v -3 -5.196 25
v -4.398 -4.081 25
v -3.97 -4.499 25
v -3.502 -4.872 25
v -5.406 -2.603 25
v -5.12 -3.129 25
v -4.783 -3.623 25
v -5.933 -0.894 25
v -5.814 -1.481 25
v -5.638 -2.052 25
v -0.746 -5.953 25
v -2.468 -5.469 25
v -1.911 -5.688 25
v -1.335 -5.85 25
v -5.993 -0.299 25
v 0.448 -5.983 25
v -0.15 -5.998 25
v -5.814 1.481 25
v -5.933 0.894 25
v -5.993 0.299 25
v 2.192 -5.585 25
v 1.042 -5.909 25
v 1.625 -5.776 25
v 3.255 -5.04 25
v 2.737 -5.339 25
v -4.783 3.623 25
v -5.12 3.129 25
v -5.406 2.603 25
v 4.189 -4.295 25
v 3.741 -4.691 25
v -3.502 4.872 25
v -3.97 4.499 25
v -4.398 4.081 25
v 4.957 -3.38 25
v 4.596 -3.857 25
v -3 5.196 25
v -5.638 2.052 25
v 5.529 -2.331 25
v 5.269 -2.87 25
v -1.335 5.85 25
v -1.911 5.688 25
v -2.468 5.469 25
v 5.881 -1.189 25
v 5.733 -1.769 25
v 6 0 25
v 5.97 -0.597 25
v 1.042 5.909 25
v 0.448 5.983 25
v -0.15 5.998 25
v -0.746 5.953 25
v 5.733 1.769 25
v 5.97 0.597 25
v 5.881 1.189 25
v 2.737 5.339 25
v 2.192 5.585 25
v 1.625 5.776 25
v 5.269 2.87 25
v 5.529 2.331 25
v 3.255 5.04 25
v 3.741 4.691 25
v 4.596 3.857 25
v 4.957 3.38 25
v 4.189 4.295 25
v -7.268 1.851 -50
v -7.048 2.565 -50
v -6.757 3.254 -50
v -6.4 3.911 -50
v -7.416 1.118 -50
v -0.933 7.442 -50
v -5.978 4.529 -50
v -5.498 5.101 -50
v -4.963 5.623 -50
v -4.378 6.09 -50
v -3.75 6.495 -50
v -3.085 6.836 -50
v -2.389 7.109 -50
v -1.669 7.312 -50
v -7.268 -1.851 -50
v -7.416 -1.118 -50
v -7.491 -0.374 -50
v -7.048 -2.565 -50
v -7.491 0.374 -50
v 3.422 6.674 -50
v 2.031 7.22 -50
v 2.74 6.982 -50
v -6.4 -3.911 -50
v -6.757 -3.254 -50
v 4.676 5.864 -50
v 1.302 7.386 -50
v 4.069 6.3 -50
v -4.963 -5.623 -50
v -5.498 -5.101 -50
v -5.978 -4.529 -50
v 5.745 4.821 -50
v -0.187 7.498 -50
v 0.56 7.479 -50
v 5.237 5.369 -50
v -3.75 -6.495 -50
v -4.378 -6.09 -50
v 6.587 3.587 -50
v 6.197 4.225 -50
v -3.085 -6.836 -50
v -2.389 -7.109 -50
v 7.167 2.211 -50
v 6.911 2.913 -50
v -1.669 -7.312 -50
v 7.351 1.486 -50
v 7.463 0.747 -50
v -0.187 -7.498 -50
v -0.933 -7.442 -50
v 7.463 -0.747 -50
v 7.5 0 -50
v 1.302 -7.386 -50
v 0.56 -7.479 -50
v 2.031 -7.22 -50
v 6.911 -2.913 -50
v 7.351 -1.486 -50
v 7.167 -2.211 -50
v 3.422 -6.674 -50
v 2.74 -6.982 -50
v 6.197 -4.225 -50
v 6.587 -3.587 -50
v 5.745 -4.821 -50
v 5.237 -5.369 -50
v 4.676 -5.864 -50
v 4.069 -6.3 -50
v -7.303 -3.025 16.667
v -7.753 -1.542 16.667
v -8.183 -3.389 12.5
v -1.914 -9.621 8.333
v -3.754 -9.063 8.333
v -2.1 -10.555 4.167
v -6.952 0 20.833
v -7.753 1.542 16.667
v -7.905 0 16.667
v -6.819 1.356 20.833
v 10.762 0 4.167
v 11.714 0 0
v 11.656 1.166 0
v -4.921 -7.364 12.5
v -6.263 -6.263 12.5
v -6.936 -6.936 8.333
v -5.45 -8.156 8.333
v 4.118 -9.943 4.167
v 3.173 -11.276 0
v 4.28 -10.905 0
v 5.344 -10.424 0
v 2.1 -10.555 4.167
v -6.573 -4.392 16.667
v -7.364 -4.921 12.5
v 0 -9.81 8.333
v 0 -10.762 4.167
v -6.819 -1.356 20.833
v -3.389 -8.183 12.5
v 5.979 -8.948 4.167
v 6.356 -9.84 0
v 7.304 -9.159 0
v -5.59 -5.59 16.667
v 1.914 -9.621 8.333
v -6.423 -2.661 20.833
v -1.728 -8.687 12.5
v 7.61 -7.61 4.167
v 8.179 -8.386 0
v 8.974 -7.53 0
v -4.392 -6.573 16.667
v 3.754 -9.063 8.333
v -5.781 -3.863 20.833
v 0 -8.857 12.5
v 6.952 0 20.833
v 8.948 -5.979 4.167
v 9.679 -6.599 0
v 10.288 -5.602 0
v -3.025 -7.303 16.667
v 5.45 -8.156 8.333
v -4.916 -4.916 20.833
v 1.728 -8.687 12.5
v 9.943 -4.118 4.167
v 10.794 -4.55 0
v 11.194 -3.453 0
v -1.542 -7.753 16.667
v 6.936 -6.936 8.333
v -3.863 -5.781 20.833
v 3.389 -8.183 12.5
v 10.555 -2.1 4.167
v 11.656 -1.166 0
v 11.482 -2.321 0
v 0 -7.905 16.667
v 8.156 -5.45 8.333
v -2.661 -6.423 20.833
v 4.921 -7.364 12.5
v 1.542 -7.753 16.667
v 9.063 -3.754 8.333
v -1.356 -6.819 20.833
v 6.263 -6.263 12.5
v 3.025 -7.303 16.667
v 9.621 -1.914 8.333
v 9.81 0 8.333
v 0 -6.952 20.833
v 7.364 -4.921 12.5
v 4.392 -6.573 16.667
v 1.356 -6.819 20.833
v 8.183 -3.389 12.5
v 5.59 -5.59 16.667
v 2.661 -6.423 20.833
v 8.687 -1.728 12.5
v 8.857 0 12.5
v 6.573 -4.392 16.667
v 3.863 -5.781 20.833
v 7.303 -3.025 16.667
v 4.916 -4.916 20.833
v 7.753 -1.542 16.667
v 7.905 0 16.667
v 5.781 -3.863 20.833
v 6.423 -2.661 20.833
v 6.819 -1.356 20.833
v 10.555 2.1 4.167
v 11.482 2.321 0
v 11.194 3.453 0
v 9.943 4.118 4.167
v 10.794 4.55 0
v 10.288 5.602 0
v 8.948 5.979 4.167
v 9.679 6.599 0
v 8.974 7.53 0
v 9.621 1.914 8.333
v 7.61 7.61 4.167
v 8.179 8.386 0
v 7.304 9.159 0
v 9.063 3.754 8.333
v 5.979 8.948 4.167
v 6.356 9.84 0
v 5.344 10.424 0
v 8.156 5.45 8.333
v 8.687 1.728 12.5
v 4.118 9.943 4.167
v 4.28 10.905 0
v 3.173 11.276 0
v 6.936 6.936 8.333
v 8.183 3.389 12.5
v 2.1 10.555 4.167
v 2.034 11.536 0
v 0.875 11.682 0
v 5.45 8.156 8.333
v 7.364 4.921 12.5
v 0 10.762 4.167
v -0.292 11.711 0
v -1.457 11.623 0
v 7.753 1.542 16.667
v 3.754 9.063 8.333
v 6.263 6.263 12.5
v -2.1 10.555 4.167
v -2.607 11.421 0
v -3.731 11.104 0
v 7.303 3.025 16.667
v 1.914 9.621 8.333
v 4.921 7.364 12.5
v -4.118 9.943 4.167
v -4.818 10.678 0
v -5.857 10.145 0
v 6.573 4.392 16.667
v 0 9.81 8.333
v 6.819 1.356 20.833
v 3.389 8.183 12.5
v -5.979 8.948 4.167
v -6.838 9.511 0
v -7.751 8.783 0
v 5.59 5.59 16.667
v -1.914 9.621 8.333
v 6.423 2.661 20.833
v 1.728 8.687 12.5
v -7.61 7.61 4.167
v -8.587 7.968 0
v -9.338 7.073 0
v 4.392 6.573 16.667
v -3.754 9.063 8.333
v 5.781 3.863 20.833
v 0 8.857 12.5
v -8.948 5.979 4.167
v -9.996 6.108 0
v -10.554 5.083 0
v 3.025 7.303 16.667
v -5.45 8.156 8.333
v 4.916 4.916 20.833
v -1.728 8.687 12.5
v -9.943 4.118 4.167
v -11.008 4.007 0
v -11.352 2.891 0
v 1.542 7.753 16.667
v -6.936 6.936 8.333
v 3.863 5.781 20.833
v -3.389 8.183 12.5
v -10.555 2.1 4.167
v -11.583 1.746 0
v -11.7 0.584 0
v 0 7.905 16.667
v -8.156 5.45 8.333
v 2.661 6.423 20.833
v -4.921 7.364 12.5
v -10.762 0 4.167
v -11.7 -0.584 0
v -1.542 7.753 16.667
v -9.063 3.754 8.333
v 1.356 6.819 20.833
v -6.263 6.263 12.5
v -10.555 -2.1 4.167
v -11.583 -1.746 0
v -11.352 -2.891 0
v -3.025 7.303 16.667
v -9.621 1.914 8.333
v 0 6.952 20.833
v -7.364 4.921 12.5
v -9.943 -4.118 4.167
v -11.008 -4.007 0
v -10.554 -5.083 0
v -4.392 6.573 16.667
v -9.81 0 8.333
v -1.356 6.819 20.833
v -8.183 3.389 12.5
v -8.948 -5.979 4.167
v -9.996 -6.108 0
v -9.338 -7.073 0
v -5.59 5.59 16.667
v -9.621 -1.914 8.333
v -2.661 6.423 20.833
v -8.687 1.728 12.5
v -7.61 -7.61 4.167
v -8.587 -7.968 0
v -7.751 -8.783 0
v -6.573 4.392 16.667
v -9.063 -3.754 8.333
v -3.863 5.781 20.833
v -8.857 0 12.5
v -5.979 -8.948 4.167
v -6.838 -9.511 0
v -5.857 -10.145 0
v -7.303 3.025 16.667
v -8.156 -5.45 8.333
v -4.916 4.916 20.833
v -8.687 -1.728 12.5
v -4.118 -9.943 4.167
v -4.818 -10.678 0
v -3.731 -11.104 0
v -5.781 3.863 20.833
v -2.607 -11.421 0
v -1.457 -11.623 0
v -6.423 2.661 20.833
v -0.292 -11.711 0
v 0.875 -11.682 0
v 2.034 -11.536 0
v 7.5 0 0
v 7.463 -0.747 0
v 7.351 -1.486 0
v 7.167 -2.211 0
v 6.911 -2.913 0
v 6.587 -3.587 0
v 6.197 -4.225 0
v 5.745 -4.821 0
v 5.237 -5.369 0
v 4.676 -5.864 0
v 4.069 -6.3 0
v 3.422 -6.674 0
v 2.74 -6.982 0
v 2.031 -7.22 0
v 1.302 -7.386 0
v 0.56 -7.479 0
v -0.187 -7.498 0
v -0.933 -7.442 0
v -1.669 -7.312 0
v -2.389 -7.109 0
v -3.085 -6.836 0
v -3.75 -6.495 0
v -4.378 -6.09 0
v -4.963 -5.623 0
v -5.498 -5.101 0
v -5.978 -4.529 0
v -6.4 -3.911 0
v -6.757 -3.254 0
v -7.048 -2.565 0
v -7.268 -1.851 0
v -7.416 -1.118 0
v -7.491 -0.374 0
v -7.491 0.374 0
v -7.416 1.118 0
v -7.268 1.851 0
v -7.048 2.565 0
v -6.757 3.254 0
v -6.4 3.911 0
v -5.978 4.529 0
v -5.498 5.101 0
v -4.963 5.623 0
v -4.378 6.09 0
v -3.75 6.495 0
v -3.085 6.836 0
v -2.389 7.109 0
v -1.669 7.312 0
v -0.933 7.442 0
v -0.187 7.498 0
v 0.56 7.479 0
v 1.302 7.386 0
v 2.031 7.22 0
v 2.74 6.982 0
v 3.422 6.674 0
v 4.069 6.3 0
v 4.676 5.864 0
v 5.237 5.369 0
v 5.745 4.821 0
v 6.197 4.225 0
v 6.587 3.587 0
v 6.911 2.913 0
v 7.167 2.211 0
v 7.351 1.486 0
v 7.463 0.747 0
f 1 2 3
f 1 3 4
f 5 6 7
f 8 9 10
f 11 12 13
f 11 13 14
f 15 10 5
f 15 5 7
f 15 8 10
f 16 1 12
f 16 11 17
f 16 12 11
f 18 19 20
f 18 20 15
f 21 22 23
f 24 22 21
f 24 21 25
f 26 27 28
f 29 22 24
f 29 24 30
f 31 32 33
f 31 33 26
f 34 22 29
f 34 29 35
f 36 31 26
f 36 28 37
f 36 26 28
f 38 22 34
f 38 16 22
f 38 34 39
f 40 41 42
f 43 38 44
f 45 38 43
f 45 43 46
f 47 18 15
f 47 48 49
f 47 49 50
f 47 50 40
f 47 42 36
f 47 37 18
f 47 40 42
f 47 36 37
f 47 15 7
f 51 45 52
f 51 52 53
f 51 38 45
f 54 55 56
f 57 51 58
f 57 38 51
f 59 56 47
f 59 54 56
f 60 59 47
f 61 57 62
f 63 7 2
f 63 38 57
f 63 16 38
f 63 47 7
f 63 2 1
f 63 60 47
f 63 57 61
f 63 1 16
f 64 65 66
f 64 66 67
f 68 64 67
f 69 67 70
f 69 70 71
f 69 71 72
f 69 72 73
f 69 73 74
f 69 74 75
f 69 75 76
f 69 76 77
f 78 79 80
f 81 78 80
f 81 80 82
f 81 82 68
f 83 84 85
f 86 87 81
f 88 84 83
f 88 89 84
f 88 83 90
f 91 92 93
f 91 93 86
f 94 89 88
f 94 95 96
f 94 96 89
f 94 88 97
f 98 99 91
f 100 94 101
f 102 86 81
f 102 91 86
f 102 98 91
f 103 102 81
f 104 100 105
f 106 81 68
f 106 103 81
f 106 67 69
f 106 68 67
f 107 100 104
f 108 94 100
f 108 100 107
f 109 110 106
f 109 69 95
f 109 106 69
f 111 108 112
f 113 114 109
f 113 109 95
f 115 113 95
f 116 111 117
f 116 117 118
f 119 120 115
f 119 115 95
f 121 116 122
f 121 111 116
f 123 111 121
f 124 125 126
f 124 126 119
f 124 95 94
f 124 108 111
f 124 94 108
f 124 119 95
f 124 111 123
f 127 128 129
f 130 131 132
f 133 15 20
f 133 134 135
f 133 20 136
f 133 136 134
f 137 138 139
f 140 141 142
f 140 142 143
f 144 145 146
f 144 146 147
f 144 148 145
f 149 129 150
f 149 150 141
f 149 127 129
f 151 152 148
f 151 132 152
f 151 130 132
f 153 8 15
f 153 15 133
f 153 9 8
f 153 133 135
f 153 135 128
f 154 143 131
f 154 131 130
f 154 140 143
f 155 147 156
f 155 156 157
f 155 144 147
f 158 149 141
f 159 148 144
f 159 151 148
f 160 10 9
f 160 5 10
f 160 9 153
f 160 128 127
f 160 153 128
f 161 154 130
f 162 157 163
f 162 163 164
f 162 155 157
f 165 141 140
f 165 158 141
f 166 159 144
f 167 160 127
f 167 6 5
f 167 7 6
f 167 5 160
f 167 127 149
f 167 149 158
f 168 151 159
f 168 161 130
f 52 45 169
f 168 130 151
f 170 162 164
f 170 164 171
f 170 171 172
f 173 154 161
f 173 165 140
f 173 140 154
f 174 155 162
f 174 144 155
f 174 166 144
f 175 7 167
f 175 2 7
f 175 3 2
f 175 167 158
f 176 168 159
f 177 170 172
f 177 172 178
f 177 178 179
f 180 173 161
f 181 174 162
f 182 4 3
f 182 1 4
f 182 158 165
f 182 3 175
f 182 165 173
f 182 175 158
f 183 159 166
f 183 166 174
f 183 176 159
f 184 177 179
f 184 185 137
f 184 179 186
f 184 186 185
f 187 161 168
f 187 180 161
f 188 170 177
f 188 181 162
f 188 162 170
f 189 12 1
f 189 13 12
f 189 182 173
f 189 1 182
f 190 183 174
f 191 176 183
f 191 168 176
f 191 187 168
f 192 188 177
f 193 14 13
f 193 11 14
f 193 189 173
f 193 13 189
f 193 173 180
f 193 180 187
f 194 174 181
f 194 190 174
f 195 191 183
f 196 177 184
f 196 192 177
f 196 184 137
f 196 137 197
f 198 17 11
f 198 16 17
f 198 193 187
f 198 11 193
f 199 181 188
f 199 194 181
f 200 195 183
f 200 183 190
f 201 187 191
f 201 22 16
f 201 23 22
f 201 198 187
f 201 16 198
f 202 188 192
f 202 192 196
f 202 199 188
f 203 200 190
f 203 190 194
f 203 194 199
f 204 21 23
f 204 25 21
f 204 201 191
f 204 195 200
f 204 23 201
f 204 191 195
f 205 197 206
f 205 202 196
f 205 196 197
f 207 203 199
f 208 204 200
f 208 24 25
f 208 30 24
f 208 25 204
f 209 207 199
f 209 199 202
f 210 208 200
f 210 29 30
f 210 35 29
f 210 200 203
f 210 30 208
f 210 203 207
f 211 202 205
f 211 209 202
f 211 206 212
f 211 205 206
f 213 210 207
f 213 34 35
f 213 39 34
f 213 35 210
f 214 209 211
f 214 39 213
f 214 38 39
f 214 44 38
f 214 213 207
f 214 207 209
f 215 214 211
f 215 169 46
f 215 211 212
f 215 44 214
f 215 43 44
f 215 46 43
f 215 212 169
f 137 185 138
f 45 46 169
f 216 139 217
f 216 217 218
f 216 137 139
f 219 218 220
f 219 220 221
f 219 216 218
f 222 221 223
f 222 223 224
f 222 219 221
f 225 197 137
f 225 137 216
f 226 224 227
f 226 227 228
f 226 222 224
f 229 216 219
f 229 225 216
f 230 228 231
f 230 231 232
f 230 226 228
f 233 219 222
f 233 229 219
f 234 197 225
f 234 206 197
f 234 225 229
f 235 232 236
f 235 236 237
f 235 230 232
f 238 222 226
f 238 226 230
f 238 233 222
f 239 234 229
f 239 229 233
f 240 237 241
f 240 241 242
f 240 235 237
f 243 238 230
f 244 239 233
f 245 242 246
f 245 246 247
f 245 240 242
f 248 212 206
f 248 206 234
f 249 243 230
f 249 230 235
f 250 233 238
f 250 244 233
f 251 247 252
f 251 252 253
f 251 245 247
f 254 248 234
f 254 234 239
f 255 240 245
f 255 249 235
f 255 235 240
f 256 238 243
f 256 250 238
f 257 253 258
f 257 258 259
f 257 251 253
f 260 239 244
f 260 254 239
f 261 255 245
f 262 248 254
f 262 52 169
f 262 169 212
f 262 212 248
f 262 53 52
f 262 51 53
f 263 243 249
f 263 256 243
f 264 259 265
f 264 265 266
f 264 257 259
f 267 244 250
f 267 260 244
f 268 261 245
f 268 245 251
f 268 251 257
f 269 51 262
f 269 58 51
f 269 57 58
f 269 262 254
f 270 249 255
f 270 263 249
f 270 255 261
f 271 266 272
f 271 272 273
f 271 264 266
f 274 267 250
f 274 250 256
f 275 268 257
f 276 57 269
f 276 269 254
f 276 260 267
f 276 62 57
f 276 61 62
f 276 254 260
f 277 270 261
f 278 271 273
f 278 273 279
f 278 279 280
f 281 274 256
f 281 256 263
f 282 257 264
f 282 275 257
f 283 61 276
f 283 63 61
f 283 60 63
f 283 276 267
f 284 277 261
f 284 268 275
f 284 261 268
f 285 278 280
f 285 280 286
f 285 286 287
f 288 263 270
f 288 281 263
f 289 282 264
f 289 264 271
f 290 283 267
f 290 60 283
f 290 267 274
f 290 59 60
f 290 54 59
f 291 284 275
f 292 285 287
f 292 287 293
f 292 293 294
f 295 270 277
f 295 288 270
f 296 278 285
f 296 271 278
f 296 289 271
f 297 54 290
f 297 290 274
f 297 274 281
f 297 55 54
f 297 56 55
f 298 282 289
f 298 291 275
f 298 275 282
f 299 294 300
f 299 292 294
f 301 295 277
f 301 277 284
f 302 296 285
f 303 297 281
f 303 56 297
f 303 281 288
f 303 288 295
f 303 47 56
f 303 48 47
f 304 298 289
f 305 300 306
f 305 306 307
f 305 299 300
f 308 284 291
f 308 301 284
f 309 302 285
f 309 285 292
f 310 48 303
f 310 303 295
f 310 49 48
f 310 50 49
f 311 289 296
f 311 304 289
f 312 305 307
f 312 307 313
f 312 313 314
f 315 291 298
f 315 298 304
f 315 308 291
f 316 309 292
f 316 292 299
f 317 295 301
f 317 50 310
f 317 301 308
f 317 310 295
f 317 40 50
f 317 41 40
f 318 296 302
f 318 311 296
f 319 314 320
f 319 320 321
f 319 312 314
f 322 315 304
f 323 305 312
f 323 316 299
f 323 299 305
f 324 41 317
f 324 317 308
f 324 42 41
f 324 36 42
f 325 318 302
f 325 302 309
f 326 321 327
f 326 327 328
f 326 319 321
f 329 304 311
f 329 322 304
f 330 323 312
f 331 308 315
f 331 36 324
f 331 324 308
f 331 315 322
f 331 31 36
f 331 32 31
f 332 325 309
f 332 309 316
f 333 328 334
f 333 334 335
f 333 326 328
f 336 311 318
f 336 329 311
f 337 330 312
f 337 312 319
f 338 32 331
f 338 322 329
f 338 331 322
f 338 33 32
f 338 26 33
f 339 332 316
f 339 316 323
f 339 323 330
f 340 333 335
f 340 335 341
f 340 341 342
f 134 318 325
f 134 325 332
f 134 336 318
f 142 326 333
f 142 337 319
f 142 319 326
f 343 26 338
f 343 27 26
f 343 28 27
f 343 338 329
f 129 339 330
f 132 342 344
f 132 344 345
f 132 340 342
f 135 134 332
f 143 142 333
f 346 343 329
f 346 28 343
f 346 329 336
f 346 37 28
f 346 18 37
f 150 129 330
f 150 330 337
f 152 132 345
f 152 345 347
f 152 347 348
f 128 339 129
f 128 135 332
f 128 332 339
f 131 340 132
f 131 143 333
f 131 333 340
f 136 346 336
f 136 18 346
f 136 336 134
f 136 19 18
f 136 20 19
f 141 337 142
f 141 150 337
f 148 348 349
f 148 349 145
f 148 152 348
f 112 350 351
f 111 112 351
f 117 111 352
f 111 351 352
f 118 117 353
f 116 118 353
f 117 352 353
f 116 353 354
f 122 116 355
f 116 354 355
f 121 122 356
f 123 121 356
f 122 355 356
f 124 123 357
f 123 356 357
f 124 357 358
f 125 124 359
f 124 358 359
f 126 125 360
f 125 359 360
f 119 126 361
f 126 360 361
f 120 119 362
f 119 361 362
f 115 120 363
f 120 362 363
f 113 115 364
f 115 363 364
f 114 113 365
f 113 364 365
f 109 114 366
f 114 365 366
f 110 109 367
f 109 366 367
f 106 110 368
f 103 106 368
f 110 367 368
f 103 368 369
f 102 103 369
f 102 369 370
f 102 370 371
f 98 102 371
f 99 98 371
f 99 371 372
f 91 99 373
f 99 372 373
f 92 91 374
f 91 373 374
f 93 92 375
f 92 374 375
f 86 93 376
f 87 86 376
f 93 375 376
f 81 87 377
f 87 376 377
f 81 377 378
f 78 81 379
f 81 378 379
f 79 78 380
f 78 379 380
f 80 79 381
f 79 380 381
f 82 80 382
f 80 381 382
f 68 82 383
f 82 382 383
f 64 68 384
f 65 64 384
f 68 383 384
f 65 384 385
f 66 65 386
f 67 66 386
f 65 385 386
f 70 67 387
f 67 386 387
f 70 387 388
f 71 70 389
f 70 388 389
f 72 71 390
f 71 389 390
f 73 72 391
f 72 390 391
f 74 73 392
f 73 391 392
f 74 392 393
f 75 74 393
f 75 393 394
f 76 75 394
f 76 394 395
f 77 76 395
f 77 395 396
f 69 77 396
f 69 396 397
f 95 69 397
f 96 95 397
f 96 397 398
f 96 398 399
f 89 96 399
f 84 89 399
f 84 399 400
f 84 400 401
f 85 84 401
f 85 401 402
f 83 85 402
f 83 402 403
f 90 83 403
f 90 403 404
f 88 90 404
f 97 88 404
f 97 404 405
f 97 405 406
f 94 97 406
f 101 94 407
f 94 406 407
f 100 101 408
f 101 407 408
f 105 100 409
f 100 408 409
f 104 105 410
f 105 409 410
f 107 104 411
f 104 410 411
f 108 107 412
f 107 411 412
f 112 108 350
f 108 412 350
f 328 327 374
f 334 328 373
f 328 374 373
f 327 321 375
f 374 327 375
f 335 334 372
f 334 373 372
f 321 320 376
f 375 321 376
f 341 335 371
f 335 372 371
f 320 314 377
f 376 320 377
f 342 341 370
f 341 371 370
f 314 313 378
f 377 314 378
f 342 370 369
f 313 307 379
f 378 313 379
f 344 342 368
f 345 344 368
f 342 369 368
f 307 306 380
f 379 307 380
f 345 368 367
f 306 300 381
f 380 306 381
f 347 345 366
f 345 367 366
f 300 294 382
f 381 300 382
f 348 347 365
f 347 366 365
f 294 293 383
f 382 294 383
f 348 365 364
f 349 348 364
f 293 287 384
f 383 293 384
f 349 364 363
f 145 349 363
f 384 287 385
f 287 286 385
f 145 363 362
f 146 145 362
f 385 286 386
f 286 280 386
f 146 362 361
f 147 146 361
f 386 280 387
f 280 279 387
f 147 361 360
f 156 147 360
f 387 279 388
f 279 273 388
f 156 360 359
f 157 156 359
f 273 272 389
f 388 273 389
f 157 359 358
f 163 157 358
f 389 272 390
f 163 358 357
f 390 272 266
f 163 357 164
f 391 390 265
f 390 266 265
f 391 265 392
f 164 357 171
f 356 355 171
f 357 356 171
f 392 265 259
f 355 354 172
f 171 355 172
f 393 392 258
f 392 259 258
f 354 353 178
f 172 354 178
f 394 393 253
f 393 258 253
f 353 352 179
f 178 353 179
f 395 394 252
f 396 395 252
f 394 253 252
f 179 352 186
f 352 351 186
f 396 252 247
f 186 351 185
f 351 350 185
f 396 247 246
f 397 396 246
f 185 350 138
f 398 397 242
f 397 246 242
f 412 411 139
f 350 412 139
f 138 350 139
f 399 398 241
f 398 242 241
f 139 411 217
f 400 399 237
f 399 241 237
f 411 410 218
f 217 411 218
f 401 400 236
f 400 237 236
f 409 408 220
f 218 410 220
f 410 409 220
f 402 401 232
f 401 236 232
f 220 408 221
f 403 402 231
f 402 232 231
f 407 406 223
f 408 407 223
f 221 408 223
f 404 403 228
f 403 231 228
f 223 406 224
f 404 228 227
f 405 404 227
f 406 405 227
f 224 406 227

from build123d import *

# Parameters (mm, degrees)
F0_R     = 14
F1_DEPTH = 25
F3_R     = 7.5
F4_DEPTH = 50


# Not quite as in the source:
# - a fillet or chamfer that OpenCascade refuses, or shapes differently, is made with other operations: its cross-section is extruded or revolved along the edge and cut away or added


with BuildPart() as f1:
    # F0 (on Top) → F1 (new body)
    with BuildSketch(Plane.XY):
        Circle(F0_R)
    extrude(amount=F1_DEPTH)

    # F2: chamfer of 8 x 35 on 1 edges, made by hand

    # F2_s1 → F2_t2 (revolve, cut)
    with BuildSketch(Plane.XZ):
        Polygon((14, -10), (6, 25), (14, 25), align=None)
    revolve(axis=Axis((0, 0, 25), (0, 0, 1)), mode=Mode.SUBTRACT)

    # F3 (on face) → F4 (join)
    with BuildSketch(Plane(origin=(0, 0, 0), x_dir=(1, 0, 0), z_dir=(0, 0, -1))):
        Circle(F3_R)
    extrude(amount=F4_DEPTH)


solid = f1.part
